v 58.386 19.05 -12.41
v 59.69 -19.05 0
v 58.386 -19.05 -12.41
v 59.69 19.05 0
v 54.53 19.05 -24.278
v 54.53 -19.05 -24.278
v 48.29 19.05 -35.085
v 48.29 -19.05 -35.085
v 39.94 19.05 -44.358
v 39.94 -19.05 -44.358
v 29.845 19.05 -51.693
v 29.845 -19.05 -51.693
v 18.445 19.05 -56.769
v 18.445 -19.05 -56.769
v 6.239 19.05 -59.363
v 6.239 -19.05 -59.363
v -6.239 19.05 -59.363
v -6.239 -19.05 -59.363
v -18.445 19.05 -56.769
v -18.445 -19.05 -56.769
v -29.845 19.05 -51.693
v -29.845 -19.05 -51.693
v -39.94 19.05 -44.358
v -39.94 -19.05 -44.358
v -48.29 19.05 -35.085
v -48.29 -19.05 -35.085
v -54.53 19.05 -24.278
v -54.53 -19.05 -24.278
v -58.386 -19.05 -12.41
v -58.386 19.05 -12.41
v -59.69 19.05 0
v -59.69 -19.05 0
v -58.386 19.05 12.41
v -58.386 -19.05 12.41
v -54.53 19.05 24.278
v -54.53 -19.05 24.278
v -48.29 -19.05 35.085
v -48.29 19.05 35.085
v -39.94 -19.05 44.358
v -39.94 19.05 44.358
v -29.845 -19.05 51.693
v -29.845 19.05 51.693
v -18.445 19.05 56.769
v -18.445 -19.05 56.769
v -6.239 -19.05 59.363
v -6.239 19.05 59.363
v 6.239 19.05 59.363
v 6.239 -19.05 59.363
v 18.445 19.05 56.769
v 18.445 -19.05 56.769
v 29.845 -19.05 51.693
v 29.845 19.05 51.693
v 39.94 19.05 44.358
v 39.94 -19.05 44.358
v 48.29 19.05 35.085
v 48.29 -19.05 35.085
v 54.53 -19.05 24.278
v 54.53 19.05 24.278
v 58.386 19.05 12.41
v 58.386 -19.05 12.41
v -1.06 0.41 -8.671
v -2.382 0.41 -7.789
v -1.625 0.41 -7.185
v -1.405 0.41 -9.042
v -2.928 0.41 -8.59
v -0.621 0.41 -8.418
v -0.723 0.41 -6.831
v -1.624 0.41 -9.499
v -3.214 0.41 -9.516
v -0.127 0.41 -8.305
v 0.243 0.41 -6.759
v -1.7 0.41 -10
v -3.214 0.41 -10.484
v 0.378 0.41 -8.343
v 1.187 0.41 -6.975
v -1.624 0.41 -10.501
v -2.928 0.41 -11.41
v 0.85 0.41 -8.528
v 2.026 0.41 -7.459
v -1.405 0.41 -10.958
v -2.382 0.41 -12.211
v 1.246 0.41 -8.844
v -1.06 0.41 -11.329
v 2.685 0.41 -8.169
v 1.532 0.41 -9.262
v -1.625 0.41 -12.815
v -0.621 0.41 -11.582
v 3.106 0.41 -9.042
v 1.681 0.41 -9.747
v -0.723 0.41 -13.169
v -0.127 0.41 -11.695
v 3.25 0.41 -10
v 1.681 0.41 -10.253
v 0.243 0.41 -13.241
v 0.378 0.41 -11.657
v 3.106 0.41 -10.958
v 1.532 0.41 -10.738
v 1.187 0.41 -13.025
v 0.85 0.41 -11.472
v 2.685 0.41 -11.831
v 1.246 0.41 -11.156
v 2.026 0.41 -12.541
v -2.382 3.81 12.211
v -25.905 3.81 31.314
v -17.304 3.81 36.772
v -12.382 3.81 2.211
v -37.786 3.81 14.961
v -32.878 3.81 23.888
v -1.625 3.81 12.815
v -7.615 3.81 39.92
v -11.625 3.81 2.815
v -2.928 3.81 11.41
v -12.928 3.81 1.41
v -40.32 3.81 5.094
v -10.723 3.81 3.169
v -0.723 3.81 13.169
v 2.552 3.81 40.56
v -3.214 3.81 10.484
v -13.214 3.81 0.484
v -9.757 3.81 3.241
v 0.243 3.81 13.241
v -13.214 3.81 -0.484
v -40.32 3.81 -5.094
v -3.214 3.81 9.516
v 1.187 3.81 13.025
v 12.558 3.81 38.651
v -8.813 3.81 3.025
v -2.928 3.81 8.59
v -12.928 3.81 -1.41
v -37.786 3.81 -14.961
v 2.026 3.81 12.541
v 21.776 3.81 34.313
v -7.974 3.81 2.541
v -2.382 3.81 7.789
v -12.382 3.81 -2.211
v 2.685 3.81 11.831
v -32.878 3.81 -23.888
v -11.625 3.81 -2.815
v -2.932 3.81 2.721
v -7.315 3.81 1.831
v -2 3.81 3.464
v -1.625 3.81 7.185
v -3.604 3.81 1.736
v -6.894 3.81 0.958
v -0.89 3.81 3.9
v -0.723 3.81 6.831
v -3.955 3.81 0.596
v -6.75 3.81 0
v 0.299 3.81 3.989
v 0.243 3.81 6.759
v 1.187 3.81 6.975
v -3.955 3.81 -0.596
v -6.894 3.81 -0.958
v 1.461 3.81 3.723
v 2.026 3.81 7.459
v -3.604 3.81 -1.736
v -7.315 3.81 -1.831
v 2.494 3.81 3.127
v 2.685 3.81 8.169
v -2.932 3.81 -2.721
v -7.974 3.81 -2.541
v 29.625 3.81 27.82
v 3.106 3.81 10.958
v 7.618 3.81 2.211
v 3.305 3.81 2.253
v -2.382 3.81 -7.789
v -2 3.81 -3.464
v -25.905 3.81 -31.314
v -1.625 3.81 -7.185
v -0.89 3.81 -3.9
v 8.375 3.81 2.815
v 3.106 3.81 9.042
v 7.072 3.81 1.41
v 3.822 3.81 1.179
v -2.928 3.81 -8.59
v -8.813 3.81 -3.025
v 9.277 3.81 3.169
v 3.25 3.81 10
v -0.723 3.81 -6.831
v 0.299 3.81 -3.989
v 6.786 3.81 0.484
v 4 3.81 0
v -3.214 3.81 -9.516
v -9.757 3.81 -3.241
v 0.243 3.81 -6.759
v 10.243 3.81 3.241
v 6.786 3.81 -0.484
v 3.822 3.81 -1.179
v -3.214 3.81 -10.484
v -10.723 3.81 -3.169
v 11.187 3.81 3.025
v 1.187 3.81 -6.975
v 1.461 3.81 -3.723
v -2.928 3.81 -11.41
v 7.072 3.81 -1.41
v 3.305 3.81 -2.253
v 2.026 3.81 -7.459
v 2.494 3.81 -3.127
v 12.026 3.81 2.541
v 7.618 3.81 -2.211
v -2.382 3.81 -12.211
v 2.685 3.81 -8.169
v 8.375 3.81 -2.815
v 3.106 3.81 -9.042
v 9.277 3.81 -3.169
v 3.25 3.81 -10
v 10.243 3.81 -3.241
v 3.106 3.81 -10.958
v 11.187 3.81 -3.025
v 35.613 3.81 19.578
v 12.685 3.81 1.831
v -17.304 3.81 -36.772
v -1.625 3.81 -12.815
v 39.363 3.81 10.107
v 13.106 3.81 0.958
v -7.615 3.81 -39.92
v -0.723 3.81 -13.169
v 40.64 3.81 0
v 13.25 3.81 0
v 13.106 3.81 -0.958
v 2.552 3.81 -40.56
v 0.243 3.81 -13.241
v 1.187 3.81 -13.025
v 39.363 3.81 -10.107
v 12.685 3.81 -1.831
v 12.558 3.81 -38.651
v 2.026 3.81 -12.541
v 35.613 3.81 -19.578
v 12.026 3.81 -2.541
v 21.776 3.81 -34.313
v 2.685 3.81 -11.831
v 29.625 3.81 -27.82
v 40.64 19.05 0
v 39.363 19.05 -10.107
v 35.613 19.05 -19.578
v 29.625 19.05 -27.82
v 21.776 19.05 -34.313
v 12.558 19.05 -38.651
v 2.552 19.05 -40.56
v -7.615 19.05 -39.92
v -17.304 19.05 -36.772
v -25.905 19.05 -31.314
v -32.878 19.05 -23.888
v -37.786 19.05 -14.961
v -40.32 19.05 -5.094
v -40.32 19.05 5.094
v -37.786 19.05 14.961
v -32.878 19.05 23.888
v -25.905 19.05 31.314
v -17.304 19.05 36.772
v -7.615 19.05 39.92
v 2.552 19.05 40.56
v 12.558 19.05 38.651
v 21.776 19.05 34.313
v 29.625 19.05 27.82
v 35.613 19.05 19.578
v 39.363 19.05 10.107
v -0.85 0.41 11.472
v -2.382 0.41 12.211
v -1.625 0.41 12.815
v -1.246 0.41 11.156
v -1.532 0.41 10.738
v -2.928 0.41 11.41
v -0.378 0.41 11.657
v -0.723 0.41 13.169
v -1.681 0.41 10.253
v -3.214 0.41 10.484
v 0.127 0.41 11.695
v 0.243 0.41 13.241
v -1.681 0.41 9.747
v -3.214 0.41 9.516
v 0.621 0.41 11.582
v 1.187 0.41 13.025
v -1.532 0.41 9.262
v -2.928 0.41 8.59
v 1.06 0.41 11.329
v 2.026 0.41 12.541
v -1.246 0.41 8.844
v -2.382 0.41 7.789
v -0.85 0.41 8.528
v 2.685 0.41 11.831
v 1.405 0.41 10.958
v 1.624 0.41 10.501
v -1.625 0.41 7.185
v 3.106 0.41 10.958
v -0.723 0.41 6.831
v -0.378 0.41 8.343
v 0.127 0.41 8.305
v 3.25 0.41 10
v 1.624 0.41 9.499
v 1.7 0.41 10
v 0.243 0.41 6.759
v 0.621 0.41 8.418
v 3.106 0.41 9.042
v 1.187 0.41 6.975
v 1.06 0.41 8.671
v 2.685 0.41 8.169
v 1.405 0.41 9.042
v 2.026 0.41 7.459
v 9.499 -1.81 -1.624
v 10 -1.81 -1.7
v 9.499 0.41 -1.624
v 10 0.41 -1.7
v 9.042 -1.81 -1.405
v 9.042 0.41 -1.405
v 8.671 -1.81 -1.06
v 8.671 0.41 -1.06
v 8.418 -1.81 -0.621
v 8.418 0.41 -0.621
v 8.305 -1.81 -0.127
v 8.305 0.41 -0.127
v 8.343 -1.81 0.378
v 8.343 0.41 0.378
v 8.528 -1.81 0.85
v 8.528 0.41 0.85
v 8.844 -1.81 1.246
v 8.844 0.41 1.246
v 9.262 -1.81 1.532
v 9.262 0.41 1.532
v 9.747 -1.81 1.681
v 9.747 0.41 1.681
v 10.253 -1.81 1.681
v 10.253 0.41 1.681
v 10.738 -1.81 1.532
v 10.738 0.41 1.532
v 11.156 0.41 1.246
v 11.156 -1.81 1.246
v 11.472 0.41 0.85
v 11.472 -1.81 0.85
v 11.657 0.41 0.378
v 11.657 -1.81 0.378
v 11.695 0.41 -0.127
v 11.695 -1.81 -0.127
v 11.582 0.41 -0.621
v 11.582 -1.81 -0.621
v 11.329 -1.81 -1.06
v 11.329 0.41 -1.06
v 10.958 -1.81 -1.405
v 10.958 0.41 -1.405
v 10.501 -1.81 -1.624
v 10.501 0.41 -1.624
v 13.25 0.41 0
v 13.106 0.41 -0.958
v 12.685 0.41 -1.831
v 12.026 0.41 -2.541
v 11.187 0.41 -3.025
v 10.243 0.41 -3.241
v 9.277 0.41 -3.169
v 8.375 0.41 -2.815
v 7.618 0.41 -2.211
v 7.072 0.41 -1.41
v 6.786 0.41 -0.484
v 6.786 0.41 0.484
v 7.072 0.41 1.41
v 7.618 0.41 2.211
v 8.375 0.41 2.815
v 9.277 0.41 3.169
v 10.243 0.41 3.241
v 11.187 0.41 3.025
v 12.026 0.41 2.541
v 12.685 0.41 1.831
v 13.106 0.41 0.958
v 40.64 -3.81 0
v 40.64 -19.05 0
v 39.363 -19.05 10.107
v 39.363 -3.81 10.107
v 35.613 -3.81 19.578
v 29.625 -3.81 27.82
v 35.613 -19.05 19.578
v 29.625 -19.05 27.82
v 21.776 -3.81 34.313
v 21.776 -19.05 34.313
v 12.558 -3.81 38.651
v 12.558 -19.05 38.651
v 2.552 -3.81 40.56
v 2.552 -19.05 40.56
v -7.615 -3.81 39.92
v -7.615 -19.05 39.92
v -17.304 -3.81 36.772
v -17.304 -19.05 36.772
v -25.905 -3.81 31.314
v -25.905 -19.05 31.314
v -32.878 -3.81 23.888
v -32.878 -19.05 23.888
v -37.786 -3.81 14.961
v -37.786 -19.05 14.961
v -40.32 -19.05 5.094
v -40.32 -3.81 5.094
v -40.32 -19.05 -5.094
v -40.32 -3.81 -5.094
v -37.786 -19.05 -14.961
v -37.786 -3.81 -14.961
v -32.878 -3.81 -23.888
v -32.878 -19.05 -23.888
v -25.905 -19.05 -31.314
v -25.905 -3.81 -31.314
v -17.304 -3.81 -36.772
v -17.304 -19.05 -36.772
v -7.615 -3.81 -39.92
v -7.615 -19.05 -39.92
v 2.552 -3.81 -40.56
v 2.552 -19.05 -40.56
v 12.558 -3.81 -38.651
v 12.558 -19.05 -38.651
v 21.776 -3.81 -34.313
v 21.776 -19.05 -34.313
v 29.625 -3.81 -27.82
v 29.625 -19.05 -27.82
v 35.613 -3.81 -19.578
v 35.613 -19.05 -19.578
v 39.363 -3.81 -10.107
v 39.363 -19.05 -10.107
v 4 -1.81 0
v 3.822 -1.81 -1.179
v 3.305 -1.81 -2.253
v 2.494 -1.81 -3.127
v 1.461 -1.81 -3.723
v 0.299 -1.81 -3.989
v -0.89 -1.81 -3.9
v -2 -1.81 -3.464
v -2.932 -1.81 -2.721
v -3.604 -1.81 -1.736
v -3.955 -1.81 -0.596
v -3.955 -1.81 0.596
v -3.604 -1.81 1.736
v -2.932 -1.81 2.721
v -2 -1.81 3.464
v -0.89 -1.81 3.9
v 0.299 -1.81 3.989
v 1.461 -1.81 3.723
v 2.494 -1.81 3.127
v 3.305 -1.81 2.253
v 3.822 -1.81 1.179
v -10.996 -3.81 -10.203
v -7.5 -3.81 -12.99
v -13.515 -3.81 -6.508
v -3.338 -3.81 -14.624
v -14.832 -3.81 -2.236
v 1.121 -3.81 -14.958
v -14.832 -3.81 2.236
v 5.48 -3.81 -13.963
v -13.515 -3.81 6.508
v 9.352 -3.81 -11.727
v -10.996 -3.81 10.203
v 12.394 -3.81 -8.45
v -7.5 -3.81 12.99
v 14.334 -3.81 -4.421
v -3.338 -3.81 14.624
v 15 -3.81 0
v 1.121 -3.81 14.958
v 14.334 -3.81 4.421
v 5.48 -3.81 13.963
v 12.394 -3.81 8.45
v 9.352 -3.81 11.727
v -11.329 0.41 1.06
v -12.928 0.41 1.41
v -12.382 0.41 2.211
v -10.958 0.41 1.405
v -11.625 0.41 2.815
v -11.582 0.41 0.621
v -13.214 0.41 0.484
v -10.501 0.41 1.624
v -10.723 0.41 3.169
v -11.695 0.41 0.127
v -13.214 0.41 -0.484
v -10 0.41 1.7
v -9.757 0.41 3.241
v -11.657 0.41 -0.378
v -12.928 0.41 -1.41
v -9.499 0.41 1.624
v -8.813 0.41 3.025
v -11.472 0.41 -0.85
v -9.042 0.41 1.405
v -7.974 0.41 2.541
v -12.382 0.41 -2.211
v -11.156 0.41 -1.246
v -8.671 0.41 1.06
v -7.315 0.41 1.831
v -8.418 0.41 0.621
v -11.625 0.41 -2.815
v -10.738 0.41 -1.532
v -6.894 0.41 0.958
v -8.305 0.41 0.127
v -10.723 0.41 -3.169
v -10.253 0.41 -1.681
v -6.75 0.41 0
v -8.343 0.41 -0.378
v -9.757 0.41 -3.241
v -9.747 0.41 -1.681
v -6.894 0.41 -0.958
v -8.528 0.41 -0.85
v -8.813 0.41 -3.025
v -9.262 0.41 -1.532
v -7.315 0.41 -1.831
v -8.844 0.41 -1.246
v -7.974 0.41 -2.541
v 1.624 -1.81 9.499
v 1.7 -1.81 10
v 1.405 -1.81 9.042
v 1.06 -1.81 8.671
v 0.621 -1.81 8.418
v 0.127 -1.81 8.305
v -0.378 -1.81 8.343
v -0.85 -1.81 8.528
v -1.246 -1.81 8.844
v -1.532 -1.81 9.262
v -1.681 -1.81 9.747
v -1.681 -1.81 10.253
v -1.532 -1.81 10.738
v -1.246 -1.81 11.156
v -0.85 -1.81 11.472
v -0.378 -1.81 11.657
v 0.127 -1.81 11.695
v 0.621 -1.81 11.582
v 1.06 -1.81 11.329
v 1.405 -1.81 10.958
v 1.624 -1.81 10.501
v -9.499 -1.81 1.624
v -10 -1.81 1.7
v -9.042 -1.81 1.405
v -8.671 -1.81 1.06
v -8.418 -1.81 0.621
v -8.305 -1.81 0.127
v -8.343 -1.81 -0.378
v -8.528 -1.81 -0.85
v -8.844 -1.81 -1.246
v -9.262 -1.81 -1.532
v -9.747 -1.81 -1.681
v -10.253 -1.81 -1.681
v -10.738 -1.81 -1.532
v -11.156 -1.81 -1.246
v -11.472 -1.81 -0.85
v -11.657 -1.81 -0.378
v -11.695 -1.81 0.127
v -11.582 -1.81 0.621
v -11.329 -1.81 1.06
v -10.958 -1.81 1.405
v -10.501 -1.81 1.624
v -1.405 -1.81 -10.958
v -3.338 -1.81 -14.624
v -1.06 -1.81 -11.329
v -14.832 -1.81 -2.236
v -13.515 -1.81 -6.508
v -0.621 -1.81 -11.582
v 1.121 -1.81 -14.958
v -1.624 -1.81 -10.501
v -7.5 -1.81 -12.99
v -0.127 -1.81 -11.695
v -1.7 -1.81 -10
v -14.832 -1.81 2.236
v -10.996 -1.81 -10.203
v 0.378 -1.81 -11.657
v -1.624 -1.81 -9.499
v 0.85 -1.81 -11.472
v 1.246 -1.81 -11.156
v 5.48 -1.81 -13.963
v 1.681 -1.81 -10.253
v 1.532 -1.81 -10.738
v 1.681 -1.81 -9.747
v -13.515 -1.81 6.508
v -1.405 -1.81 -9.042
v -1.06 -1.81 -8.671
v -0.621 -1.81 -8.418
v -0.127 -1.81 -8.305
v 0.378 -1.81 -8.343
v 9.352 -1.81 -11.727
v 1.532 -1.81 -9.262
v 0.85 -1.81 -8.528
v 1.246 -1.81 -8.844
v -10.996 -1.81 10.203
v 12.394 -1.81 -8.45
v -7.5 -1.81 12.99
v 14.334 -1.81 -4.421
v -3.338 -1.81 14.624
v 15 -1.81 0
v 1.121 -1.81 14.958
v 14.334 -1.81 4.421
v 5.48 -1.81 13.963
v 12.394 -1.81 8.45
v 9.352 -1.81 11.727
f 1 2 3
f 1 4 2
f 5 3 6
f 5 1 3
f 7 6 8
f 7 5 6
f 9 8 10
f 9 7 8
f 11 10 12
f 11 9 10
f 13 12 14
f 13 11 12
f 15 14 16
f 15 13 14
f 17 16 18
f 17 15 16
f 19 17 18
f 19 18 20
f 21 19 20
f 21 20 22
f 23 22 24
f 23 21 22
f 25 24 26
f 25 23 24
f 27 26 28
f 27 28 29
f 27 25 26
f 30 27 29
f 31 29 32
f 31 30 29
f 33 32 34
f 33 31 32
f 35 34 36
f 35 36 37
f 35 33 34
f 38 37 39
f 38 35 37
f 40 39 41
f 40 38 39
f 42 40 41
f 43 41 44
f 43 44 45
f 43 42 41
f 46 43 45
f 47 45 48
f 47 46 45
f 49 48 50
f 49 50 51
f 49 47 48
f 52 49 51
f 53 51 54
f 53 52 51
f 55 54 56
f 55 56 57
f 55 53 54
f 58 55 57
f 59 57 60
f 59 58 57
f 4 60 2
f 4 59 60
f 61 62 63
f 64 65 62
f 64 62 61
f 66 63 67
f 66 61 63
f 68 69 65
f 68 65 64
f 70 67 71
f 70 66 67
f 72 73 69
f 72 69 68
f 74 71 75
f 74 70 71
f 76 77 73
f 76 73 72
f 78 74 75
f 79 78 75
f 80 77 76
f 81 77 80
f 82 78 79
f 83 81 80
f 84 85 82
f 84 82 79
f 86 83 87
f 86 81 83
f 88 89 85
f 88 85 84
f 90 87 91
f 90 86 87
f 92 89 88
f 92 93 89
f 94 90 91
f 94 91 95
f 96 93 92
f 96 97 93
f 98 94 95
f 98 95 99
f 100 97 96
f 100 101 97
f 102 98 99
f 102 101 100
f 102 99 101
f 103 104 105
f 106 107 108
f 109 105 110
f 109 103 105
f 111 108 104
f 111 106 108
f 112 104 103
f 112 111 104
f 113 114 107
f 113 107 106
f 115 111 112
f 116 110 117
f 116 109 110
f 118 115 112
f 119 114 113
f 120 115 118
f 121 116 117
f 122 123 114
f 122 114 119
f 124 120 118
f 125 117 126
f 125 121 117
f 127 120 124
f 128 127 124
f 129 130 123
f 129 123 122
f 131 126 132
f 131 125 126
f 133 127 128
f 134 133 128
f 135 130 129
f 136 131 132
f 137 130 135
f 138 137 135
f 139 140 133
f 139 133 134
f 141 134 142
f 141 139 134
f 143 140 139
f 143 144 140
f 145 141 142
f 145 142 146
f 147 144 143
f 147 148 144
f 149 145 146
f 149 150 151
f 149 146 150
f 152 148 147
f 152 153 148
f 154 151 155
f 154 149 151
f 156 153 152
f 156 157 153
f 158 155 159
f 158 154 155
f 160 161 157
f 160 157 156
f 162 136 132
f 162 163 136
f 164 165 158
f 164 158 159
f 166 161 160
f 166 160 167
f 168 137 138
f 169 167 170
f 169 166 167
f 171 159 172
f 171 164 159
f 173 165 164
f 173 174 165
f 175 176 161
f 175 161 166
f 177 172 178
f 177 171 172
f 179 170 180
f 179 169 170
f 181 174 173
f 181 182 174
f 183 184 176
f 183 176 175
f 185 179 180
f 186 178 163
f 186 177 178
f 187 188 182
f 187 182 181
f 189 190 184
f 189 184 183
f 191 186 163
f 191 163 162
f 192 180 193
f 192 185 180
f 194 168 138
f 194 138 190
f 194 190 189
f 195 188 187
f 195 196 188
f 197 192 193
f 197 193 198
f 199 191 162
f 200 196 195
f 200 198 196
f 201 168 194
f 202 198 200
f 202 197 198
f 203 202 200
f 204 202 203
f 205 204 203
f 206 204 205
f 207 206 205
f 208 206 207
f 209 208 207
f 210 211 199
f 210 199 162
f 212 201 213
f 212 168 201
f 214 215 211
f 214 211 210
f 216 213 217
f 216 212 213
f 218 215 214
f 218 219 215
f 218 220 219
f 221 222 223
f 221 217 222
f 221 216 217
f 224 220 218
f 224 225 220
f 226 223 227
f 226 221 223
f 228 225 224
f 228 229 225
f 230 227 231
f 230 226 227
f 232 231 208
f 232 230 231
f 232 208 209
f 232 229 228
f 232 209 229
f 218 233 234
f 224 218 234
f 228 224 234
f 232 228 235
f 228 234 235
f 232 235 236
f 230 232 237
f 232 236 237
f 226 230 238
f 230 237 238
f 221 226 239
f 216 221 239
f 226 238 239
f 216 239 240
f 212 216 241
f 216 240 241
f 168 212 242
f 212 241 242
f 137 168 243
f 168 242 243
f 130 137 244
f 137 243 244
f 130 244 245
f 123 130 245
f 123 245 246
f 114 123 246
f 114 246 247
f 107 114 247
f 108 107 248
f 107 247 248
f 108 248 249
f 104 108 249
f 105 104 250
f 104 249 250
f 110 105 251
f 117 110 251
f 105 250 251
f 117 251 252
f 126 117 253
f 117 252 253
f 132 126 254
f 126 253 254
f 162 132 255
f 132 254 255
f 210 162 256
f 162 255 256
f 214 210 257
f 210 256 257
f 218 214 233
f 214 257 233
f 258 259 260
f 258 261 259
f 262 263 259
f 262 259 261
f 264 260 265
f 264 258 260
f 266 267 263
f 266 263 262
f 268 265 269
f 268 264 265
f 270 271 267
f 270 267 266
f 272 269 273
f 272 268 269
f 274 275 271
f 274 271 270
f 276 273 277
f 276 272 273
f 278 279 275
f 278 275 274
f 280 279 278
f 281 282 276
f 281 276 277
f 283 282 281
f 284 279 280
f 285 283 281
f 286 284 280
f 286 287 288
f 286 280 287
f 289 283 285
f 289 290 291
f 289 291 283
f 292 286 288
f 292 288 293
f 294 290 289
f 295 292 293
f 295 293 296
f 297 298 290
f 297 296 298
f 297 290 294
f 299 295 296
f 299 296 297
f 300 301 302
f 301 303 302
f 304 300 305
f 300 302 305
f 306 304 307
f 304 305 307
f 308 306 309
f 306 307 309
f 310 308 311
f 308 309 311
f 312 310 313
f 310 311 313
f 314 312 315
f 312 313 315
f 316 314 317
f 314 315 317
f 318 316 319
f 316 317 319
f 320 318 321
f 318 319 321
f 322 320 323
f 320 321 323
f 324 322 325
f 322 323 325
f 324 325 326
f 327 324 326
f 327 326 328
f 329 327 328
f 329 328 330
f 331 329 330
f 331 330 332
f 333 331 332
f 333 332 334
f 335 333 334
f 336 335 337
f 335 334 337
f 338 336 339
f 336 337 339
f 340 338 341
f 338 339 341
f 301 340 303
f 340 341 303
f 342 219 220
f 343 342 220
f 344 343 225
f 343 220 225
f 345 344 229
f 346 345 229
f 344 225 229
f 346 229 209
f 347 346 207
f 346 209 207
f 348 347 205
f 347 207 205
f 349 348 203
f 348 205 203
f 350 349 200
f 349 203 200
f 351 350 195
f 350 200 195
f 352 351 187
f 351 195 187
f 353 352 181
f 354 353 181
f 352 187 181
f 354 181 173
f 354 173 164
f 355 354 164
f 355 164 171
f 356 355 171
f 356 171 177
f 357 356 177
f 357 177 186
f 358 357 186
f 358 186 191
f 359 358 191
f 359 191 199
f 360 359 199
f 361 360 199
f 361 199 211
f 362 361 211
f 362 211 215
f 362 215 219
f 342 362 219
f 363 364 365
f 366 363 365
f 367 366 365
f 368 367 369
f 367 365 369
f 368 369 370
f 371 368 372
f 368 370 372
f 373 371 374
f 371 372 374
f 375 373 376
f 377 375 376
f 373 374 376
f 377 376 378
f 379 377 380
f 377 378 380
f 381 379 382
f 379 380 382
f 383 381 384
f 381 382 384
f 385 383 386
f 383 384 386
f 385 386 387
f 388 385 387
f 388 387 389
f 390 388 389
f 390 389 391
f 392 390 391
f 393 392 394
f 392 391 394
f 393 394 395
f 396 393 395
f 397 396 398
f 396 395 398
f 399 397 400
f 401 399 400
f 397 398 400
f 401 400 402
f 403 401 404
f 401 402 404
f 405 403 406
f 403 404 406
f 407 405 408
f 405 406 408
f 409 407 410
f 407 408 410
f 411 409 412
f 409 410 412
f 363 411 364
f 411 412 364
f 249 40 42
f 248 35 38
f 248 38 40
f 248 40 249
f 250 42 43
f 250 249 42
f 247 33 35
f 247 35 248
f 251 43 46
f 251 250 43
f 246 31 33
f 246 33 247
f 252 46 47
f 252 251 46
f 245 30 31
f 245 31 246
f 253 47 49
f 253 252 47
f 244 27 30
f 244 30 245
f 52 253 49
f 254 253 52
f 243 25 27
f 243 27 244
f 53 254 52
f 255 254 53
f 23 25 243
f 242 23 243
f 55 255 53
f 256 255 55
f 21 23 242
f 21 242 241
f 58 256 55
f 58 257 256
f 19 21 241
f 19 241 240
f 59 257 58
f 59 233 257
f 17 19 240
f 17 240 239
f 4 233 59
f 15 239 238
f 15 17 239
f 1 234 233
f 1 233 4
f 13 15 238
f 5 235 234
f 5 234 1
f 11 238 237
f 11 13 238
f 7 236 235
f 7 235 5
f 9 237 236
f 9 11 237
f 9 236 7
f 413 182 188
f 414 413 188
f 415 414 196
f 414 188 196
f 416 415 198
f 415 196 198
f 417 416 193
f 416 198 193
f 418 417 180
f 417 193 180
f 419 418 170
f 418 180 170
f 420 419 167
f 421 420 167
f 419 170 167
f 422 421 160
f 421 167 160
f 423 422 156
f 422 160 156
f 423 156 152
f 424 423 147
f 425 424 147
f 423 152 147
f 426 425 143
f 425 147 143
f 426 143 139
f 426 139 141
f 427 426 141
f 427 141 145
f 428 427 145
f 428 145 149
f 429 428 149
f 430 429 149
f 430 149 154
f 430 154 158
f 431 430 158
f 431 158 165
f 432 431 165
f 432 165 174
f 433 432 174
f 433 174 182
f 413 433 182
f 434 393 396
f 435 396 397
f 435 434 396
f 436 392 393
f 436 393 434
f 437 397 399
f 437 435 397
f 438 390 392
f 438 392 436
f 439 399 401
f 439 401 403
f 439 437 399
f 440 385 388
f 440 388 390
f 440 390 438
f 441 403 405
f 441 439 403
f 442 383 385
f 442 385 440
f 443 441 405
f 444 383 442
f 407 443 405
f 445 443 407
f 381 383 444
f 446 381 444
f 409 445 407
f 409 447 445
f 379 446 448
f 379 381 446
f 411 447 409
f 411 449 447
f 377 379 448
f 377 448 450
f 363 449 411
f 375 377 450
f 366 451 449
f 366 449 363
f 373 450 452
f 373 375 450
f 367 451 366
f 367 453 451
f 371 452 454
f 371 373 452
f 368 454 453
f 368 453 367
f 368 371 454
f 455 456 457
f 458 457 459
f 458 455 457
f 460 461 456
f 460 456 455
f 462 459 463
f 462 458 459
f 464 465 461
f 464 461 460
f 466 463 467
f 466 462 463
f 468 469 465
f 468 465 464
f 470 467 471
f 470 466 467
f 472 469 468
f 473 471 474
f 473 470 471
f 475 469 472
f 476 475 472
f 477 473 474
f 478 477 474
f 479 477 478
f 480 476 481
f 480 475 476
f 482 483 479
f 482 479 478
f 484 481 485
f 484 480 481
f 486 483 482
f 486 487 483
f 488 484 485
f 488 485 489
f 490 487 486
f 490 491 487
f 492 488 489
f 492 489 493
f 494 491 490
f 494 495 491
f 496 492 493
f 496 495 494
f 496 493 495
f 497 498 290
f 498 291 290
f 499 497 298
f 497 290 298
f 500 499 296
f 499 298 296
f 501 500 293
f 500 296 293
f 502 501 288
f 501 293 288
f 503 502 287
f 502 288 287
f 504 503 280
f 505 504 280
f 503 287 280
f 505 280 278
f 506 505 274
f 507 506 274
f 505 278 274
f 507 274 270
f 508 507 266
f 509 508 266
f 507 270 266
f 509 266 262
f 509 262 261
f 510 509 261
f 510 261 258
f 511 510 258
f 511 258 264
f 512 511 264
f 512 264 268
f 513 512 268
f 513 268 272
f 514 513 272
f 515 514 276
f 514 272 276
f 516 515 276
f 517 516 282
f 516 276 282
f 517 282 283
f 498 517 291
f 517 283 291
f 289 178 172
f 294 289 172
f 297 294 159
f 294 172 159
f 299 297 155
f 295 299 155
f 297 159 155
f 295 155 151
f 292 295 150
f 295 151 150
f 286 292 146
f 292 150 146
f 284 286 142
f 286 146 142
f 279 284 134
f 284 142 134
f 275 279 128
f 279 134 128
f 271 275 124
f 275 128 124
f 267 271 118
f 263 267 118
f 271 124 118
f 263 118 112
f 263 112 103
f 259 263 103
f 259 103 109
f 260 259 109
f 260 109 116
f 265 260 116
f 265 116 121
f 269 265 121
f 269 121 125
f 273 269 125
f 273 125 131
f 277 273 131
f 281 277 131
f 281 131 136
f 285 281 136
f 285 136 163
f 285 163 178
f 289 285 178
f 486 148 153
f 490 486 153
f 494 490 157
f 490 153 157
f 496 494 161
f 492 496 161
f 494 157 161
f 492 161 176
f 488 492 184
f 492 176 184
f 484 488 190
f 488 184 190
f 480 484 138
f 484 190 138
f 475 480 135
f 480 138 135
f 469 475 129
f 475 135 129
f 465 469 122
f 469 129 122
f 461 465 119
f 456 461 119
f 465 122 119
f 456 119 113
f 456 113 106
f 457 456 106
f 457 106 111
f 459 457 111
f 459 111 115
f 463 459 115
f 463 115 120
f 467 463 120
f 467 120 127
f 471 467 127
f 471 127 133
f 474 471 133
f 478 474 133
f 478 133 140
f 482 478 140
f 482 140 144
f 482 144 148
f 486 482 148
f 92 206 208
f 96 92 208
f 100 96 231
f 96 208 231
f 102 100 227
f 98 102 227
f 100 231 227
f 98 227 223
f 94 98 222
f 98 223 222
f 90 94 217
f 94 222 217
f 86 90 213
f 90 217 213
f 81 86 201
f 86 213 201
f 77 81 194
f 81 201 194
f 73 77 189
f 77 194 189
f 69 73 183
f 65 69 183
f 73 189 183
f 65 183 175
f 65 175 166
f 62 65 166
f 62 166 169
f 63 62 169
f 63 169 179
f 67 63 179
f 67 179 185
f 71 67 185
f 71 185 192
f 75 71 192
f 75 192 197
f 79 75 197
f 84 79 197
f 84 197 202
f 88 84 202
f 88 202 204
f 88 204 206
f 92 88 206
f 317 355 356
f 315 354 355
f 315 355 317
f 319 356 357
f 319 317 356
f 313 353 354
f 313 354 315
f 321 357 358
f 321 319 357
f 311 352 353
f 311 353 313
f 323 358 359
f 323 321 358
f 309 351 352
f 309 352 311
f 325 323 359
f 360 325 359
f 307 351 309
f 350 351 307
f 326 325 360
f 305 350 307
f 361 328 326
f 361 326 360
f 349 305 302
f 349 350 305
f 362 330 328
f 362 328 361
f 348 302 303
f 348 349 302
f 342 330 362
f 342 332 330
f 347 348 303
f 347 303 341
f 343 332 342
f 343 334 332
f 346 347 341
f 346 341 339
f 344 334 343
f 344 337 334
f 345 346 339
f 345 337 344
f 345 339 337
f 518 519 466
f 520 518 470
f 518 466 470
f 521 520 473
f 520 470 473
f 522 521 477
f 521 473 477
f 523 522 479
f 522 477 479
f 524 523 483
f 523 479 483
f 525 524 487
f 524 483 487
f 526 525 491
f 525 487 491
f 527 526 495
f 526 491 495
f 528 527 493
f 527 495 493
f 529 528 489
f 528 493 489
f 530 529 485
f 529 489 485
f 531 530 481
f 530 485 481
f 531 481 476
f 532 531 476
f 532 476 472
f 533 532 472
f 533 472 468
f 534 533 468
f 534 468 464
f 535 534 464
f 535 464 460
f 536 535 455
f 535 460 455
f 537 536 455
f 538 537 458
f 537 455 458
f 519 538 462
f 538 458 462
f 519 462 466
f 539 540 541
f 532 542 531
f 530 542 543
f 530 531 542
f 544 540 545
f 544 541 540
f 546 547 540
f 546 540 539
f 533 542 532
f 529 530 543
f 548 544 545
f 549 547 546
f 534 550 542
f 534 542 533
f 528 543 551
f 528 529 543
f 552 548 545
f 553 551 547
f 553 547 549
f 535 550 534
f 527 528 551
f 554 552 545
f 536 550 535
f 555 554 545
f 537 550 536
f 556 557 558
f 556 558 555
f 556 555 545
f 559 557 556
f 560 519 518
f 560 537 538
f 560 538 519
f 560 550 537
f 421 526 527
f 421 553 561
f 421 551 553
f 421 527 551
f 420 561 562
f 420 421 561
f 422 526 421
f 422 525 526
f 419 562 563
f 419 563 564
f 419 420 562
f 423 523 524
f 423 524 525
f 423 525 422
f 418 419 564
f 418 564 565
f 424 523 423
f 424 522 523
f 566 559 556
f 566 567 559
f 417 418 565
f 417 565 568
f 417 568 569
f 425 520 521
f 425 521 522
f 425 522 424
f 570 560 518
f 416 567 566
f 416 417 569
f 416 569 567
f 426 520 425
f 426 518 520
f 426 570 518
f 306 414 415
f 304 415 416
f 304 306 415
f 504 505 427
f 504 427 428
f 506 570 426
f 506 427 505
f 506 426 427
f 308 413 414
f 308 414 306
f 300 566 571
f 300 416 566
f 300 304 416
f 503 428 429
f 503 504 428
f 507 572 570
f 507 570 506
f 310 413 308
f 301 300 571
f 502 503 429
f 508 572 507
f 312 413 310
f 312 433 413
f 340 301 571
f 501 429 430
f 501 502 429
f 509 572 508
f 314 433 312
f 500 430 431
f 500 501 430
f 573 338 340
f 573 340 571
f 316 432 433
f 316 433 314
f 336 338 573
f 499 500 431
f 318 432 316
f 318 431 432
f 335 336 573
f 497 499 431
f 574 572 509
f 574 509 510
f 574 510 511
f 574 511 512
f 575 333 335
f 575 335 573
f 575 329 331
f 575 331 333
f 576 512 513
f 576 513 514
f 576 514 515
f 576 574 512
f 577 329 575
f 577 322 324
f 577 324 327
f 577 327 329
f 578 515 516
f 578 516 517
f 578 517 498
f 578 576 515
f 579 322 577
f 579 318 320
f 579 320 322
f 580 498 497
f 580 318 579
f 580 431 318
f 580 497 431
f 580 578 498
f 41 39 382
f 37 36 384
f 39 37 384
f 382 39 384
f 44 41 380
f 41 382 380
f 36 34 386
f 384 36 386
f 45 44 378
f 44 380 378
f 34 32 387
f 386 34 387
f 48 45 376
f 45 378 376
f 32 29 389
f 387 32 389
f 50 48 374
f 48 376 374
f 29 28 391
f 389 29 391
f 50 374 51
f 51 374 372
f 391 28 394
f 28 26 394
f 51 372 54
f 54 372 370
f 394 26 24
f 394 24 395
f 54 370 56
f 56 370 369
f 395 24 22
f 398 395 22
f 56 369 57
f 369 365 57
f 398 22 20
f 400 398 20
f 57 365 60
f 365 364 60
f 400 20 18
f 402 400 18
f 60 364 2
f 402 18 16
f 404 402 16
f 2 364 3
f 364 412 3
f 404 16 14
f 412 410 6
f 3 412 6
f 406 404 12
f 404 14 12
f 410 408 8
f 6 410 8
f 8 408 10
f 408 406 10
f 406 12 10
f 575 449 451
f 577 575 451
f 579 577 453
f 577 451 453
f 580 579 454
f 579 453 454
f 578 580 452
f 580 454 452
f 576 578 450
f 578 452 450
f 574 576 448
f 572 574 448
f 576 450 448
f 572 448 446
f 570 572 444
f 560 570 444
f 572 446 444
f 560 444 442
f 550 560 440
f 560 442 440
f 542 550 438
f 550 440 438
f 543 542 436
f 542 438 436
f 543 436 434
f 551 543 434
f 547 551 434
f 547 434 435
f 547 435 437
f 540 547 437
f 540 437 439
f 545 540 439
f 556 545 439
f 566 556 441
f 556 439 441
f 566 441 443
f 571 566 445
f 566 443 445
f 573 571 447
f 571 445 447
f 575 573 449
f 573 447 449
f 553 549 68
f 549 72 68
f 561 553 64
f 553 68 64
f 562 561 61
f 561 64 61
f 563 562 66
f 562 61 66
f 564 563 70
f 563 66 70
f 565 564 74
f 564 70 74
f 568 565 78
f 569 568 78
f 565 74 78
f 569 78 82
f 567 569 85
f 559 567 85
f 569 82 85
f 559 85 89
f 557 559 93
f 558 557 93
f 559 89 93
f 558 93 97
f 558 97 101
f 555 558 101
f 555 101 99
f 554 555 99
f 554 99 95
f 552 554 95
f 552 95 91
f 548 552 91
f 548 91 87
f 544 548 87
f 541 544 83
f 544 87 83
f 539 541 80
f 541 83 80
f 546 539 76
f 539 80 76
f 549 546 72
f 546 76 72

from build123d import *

# Parameters (mm, degrees)
BOSS_EXTRUDE1_DEPTH                                 = 19.05
BOSS_EXTRUDE1_DEPTH_BACK                            = 19.05
SKETCH1_R                                           = 59.69
SKETCH2_R                                           = 40.64
CUT_EXTRUDE2_DEPTH                                  = 15.24
CUT_EXTRUDE7_START                                  = -15.24
SKETCH13_R                                          = 40.64
CUT_EXTRUDE7_DEPTH                                  = 15.24
SKETCH7_R                                           = 4
CUT_EXTRUDE6_DEPTH                                  = 25
SKETCH6_R                                           = 1.7
CUT_EXTRUDE5_DEPTH                                  = 10
CIRPATTERN2_COUNT                                   = 4
CBORE_FOR_M3_HEX_SOCKET_HEAD_CAP_SCREW1_D           = 3.4
CBORE_FOR_M3_HEX_SOCKET_HEAD_CAP_SCREW1_DEPTH       = 5
CBORE_FOR_M3_HEX_SOCKET_HEAD_CAP_SCREW1_CBORE_D     = 6.5
CBORE_FOR_M3_HEX_SOCKET_HEAD_CAP_SCREW1_CBORE_DEPTH = 3.4
CBORE_FOR_M3_HEX_SOCKET_HEAD_CAP_SCREW1_TIP         = 1.021463052
SKETCH14_R                                          = 15
CUT_EXTRUDE8_DEPTH                                  = 2


with BuildPart() as part:
    # Sketch1 → Boss-Extrude1 (new, two sides: drawn at the far end of the back side and taken through both)
    with BuildSketch(Plane(origin=(0, 0, 0), x_dir=(1, 0, 0), z_dir=(0, 1, 0)).offset(-BOSS_EXTRUDE1_DEPTH_BACK)):
        Circle(SKETCH1_R)
    extrude(amount=BOSS_EXTRUDE1_DEPTH + BOSS_EXTRUDE1_DEPTH_BACK)

    # Sketch2 → Cut-Extrude2 (cut)
    with BuildSketch(Plane.XZ.offset(19.05)):
        Circle(SKETCH2_R)
    extrude(amount=-CUT_EXTRUDE2_DEPTH, mode=Mode.SUBTRACT)

    # Sketch13 → Cut-Extrude7 (cut)
    with BuildSketch(Plane(origin=(0, 19.05, 0), x_dir=(1, 0, 0), z_dir=(0, 1, 0)).offset(CUT_EXTRUDE7_START)):
        Circle(SKETCH13_R)
    extrude(amount=CUT_EXTRUDE7_DEPTH, mode=Mode.SUBTRACT)

    # Sketch7 → Cut-Extrude6 (cut)
    with BuildSketch(Plane(origin=(0, 3.81, 0), x_dir=(1, 0, 0), z_dir=(0, 1, 0))):
        Circle(SKETCH7_R)
    cut_extrude6 = extrude(amount=-CUT_EXTRUDE6_DEPTH, mode=Mode.SUBTRACT)

    # Sketch6 → Cut-Extrude5 (cut)
    with BuildSketch(Plane(origin=(0, 3.81, 0), x_dir=(1, 0, 0), z_dir=(0, 1, 0))):
        with Locations((0, -10)):
            Circle(SKETCH6_R)
    cut_extrude5 = extrude(amount=-CUT_EXTRUDE5_DEPTH, mode=Mode.SUBTRACT)

    # CirPattern2: Cut-Extrude6, Cut-Extrude5 ×4 about axis
    cirpattern2_axis = Axis((0, 3.81, 0), (0, 1, 0))
    add([cut_extrude6.rotate(cirpattern2_axis, i * 360 / CIRPATTERN2_COUNT) for i in range(1, CIRPATTERN2_COUNT)], mode=Mode.SUBTRACT)
    add([cut_extrude5.rotate(cirpattern2_axis, i * 360 / CIRPATTERN2_COUNT) for i in range(1, CIRPATTERN2_COUNT)], mode=Mode.SUBTRACT)

    # CBORE for M3 Hex Socket Head Cap Screw1
    with Locations(Plane(origin=(0, 3.81, 0), x_dir=(1, 0, 0), z_dir=(0, 1, 0))):
        with Locations((0, -10), (10, 0), (0, 10), (-10, 0)):
            CounterBoreHole(CBORE_FOR_M3_HEX_SOCKET_HEAD_CAP_SCREW1_D / 2, CBORE_FOR_M3_HEX_SOCKET_HEAD_CAP_SCREW1_CBORE_D / 2, CBORE_FOR_M3_HEX_SOCKET_HEAD_CAP_SCREW1_CBORE_DEPTH, depth=CBORE_FOR_M3_HEX_SOCKET_HEAD_CAP_SCREW1_DEPTH)
            with Locations((0, 0, -(CBORE_FOR_M3_HEX_SOCKET_HEAD_CAP_SCREW1_DEPTH + CBORE_FOR_M3_HEX_SOCKET_HEAD_CAP_SCREW1_TIP / 2))):  # 118° drill point
                Cone(0, CBORE_FOR_M3_HEX_SOCKET_HEAD_CAP_SCREW1_D / 2, CBORE_FOR_M3_HEX_SOCKET_HEAD_CAP_SCREW1_TIP, mode=Mode.SUBTRACT)

    # Sketch14 → Cut-Extrude8 (cut)
    with BuildSketch(Plane.XZ.offset(3.81)):
        Circle(SKETCH14_R)
    extrude(amount=-CUT_EXTRUDE8_DEPTH, mode=Mode.SUBTRACT)


solid = part.part
